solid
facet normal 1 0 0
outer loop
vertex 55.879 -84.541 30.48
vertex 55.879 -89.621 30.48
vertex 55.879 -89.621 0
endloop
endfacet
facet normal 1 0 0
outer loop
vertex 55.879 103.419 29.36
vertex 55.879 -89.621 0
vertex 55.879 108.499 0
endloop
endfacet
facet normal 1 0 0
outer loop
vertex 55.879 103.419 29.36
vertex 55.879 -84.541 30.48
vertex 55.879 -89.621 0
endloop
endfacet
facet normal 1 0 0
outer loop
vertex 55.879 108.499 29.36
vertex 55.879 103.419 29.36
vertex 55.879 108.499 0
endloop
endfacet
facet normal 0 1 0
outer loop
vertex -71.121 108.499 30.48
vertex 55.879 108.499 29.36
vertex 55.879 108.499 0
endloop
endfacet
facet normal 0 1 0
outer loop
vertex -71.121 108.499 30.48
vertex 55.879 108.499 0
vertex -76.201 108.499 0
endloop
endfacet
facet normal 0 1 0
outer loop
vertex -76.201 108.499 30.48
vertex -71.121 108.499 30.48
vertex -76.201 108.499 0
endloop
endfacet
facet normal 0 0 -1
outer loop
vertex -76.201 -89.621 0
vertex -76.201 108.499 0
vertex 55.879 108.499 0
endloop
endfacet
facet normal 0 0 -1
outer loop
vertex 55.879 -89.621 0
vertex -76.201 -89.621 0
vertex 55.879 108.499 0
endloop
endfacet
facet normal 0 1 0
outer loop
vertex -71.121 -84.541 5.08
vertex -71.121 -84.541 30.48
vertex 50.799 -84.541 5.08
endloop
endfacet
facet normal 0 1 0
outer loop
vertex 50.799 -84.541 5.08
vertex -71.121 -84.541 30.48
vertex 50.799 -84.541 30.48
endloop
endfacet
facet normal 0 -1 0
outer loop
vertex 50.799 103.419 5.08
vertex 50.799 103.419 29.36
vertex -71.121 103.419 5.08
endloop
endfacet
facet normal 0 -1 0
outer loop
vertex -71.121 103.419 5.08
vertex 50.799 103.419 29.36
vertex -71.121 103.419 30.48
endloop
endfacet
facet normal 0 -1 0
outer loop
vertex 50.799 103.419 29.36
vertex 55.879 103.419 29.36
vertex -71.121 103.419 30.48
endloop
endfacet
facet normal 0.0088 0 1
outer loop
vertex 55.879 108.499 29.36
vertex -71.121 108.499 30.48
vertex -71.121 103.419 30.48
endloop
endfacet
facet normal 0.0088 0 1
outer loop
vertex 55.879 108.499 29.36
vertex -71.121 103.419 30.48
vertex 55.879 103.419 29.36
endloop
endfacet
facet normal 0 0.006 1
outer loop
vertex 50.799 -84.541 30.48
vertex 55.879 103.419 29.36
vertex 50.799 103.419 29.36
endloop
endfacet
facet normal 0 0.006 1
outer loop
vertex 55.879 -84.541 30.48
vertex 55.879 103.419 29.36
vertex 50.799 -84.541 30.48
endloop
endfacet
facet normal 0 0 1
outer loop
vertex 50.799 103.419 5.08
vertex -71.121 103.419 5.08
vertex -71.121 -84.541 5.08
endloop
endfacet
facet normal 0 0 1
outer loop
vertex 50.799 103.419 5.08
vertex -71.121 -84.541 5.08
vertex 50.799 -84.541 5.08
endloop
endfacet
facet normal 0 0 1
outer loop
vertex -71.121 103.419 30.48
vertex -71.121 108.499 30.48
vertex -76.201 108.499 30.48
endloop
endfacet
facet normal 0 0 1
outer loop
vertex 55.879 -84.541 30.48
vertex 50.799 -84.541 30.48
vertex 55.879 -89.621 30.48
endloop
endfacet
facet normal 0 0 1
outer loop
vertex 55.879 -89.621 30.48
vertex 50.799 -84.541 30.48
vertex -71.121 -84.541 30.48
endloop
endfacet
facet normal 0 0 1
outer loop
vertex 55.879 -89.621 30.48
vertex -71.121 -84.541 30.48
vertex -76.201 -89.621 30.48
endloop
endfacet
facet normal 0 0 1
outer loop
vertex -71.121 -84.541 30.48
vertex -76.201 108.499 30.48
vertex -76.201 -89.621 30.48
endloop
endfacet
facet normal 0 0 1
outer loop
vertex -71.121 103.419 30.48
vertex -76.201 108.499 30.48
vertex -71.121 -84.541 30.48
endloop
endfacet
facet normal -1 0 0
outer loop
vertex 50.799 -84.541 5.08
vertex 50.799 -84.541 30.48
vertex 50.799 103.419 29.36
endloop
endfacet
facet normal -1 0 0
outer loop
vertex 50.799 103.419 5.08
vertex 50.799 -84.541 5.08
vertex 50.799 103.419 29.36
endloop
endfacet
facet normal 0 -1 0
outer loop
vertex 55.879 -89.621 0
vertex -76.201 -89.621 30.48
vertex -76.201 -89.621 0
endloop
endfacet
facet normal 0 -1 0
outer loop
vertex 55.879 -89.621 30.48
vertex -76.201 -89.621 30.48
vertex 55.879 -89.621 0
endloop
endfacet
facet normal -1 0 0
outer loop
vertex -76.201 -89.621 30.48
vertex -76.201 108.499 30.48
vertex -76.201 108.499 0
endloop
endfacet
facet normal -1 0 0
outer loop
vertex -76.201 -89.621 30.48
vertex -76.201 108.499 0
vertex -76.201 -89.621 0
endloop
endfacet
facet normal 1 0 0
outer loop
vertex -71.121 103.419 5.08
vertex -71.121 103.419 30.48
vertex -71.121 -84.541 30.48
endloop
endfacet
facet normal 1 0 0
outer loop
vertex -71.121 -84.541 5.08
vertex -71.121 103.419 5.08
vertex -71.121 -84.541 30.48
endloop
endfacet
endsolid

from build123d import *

# Parameters (mm, degrees)
F0_W     = 132.08
F0_H     = 198.12
F1_DEPTH = 5.08
F2_W     = 132.08
F2_H     = 25.4
F3_DEPTH = 5.08
F4_W     = 193.04
F4_H     = 25.4
F5_DEPTH = 5.08
F7_DEPTH = 5.08
F9_DEPTH = 5.08


with BuildPart() as f1:
    # F0 (on Top) → F1 (new body)
    with BuildSketch(Plane.XY):
        with Locations((-10.161369, 9.438567)):
            Rectangle(F0_W, F0_H)
    extrude(amount=F1_DEPTH)

    # F2 (on face) → F3 (join)
    with BuildSketch(Plane.XZ.offset(89.621433)):
        with Locations((-10.161369, 17.78)):
            Rectangle(F2_W, F2_H)
    extrude(amount=-F3_DEPTH)

    # F4 (on face) → F5 (join)
    with BuildSketch(Plane(origin=(-76.201369, 0, 0), x_dir=(0, -1, 0), z_dir=(-1, 0, 0))):
        with Locations((-11.978567, 17.78)):
            Rectangle(F4_W, F4_H)
    extrude(amount=-F5_DEPTH)

    # F6 (on face) → F7 (join)
    with BuildSketch(Plane(origin=(0, 108.498567, 0), x_dir=(-1, 0, 0), z_dir=(0, 1, 0))):
        Polygon((-55.878631, 29.360438), (-55.878631, 5.08), (71.121369, 5.08), (71.121369, 30.48), align=None)
    extrude(amount=-F7_DEPTH)

    # F8 (on face) → F9 (join)
    with BuildSketch(Plane.YZ.offset(55.878631)):
        Polygon((103.418567, 29.360438), (-84.541433, 30.48), (-84.541433, 5.08), (103.418567, 5.08), align=None)
    extrude(amount=-F9_DEPTH)


solid = f1.part
